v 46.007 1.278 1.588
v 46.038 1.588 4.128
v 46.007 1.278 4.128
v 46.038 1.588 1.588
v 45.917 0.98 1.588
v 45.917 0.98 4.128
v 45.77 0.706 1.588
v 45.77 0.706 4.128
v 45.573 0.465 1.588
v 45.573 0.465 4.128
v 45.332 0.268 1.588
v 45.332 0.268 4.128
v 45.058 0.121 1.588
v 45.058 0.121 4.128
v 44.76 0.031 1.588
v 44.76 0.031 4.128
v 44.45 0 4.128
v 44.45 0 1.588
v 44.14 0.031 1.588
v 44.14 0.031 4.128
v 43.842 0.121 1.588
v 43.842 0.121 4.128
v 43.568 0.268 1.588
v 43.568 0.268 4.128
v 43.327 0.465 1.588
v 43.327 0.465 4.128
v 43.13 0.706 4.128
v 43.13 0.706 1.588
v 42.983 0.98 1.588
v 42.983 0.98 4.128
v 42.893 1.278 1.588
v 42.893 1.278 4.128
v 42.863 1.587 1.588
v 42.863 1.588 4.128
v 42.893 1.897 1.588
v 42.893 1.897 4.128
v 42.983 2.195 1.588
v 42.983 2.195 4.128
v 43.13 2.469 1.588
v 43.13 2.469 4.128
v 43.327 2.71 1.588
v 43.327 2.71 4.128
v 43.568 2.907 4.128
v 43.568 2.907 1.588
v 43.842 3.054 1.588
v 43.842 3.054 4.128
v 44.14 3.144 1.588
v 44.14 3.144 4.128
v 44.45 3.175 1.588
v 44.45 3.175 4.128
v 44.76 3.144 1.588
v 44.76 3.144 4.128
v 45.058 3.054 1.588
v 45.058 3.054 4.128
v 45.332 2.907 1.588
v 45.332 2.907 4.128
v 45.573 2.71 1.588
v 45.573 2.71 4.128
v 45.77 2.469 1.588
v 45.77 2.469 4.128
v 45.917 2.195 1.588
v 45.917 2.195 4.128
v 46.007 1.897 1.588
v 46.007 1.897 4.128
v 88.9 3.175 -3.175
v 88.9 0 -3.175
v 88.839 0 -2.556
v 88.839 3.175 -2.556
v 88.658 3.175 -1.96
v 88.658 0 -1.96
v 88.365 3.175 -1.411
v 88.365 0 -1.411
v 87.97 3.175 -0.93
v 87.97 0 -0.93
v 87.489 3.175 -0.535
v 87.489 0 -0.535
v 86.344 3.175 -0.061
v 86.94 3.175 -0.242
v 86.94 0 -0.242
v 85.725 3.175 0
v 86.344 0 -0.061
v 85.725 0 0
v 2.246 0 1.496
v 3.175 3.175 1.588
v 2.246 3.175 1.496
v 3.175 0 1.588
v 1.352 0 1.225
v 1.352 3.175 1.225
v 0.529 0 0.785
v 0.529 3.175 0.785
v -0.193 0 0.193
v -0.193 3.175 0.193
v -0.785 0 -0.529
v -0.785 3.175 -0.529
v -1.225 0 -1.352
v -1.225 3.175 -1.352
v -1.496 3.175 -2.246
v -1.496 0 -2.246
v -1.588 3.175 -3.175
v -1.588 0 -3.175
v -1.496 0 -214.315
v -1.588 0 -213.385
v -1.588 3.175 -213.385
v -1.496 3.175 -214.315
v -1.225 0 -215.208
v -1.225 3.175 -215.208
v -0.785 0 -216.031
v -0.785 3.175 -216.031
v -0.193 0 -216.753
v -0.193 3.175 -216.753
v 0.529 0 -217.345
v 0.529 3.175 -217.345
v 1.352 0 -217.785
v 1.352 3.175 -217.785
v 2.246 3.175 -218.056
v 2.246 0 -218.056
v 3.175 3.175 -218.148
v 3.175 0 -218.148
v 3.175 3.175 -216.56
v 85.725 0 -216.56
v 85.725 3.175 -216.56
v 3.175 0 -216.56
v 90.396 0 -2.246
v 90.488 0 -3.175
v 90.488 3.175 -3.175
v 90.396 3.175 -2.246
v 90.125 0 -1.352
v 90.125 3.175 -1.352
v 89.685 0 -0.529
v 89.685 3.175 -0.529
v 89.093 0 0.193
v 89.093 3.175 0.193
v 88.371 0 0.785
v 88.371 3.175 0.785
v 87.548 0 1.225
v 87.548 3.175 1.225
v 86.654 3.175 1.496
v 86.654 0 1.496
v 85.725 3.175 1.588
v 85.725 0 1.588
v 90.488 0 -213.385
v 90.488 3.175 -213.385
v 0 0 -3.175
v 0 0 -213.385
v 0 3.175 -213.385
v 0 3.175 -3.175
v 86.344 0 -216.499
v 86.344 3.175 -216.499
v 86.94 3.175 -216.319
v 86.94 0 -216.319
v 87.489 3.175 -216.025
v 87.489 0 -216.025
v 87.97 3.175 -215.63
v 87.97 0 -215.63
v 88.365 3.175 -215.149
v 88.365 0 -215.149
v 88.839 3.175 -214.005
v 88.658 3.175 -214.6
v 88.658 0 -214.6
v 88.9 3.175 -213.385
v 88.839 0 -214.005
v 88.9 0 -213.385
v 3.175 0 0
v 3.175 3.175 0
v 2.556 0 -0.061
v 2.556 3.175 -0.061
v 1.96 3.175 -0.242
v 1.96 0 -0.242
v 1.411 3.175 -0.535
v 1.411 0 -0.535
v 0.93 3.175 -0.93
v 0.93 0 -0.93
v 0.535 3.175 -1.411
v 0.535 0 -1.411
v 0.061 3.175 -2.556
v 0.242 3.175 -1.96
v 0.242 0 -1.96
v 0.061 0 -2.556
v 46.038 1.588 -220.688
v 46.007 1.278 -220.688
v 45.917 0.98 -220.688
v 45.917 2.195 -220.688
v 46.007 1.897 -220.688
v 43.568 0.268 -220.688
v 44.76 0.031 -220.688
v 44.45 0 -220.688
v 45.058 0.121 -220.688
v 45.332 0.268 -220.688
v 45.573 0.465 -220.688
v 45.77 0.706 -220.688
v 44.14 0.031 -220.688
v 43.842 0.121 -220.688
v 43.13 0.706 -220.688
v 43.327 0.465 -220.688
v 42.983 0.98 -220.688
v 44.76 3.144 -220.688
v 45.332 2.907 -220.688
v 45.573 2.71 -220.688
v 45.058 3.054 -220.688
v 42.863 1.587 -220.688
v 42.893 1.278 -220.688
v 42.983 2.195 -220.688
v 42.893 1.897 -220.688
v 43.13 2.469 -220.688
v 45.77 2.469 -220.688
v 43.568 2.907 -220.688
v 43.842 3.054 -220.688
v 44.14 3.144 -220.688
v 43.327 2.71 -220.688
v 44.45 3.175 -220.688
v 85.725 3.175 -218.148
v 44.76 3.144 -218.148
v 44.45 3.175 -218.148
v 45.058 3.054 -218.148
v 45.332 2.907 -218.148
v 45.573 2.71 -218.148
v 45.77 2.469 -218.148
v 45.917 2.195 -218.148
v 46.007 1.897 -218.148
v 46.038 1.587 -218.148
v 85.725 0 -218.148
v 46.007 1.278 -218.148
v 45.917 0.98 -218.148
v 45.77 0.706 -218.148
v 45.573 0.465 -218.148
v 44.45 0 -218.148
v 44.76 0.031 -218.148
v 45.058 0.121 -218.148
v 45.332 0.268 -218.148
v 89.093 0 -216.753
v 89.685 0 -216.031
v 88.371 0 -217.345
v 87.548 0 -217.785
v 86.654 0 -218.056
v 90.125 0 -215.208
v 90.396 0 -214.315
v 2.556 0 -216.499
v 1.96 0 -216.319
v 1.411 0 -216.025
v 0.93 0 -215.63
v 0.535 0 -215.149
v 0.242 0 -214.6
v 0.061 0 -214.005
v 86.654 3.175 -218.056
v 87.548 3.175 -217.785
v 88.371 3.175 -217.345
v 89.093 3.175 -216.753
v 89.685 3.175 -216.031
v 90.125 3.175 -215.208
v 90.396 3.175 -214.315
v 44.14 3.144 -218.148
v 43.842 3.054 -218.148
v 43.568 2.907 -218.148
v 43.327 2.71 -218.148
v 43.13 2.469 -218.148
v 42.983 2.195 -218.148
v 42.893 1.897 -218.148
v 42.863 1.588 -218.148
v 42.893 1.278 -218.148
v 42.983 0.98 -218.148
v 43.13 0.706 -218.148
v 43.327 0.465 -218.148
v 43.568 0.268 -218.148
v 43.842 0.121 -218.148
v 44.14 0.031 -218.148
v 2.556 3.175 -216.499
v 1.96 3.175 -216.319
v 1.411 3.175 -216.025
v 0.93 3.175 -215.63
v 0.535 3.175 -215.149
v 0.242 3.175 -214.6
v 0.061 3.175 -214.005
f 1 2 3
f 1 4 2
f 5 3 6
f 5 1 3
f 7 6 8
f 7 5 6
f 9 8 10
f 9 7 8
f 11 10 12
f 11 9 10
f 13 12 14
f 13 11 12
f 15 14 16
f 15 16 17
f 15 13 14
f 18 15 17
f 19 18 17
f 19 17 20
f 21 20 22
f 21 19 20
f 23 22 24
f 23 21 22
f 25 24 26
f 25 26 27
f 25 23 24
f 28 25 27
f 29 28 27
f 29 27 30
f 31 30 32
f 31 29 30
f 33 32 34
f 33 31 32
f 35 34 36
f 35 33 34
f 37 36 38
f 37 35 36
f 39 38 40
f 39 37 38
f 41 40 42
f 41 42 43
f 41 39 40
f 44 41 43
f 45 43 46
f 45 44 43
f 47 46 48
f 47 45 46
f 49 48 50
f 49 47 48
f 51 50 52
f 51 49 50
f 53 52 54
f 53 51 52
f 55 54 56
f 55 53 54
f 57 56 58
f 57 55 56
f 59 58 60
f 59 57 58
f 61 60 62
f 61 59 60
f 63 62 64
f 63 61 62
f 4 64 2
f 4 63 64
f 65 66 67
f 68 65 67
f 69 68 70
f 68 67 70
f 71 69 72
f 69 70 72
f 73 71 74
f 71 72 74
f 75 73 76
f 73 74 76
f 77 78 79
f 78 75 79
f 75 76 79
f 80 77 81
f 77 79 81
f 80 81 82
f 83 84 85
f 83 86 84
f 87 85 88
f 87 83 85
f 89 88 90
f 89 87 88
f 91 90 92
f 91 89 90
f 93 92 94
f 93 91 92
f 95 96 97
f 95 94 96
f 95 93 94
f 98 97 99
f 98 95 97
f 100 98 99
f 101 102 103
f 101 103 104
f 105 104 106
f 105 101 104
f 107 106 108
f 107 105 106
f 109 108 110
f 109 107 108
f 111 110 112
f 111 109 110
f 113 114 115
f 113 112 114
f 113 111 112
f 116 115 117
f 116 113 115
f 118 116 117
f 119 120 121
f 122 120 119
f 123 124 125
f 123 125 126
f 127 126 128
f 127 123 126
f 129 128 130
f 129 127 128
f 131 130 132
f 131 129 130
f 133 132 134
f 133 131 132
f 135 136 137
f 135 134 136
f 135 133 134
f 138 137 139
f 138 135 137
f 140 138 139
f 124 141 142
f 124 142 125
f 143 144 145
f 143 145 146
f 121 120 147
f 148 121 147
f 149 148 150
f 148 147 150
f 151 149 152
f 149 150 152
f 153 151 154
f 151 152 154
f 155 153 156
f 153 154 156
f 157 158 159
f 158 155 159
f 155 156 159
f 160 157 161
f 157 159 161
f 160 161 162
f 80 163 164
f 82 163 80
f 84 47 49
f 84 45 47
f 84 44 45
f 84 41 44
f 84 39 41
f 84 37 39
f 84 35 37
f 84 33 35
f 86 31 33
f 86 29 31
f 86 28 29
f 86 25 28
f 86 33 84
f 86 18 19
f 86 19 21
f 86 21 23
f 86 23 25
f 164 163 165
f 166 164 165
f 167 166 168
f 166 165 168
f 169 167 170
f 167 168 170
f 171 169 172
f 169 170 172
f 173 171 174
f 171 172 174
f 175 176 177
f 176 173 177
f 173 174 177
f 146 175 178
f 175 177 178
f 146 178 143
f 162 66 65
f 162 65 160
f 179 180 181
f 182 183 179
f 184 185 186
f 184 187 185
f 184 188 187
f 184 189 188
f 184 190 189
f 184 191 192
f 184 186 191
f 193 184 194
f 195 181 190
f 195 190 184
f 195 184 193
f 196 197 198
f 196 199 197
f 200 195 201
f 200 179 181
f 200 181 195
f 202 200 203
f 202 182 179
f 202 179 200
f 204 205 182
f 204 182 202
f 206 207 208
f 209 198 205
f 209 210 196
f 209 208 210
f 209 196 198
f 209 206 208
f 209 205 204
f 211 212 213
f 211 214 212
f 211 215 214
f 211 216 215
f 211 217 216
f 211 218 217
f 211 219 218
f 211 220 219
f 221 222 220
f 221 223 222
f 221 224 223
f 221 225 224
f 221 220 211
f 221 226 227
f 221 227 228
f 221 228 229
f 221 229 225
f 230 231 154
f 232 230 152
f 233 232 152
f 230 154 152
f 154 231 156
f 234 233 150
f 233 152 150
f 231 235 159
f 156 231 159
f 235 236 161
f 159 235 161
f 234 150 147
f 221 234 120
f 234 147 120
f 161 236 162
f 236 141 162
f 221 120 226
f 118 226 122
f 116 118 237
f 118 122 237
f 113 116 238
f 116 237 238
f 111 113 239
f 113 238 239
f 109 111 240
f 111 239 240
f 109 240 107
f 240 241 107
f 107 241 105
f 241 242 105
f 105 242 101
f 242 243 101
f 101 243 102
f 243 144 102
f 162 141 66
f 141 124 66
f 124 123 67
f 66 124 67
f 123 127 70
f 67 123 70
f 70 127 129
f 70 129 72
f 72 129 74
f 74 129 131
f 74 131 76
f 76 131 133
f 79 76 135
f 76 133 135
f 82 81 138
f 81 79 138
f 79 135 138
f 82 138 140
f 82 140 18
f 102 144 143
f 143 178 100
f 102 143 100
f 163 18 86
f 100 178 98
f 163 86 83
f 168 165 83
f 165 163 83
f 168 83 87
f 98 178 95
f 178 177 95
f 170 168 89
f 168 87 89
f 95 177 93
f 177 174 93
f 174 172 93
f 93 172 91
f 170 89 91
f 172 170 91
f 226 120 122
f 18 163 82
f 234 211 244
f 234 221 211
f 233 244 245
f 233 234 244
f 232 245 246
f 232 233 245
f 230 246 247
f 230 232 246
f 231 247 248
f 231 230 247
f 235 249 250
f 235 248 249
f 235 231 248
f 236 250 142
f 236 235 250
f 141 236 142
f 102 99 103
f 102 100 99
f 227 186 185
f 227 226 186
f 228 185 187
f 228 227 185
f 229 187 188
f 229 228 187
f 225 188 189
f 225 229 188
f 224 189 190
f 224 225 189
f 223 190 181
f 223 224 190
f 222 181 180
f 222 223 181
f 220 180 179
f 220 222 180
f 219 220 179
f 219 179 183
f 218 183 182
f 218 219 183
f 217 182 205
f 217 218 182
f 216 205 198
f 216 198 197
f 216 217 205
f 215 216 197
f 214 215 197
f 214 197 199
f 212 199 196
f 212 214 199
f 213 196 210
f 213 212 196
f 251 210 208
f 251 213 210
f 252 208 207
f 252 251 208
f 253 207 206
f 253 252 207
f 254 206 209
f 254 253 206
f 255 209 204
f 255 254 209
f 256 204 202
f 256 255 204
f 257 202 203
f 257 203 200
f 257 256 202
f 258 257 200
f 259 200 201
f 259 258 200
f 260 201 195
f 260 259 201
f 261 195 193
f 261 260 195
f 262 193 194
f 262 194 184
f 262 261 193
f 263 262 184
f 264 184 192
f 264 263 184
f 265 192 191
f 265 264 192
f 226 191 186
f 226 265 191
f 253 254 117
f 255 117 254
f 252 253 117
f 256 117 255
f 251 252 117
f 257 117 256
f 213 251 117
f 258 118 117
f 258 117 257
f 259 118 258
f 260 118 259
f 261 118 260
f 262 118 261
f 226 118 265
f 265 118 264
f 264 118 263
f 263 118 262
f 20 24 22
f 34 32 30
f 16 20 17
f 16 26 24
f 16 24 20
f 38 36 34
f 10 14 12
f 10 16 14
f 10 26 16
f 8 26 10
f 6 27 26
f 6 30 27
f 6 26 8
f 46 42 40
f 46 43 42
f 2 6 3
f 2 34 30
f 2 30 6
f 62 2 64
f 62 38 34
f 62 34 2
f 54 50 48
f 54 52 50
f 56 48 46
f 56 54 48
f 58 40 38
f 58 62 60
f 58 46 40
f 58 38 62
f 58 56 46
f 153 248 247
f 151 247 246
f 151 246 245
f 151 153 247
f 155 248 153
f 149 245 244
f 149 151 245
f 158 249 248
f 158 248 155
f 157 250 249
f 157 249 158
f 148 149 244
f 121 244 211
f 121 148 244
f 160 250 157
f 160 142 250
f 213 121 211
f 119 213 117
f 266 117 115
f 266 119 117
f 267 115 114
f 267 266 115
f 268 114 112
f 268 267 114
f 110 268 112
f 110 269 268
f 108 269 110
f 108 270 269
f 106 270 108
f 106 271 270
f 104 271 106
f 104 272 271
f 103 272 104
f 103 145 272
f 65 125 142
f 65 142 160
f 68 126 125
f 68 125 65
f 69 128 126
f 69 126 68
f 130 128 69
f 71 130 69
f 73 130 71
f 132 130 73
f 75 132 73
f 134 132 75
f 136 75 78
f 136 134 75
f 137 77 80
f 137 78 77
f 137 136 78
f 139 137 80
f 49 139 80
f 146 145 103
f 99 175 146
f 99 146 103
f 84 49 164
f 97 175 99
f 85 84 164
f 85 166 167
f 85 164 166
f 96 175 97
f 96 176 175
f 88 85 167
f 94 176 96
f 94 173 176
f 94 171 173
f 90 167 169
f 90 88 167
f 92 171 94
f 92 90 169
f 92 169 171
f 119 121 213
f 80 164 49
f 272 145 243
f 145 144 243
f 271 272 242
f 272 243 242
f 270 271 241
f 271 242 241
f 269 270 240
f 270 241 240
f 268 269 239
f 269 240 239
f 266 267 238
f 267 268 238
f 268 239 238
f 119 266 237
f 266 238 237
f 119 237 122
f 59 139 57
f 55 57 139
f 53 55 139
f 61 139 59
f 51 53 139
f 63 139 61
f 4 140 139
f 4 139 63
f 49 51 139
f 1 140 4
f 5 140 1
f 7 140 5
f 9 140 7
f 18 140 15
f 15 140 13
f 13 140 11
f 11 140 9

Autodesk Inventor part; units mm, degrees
ref_plane "YZ Plane" through (0, 0, 0) normal (1, 0, 0) x (0, 1, 0)
ref_plane "XZ Plane" through (0, 0, 0) normal (0, 1, 0) x (-1, 0, 0)
ref_plane "XY Plane" through (0, 0, 0) normal (0, 0, 1) x (1, 0, 0)
sketch "Sketch1" plane through (0, 0, 0) normal (0, 1, 0) x (-1, 0, 0)
  line L0 (-3.175, 0) -> (-85.725, 0)
  line L1 (-88.9, -3.175) -> (-88.9, -213.3854)
  line L2 (-85.725, -216.5604) -> (-3.175, -216.5604)
  line L3 (0, -213.3854) -> (0, -3.175)
  arc A0 (0, -3.175) -> (-3.175, 0) centre (-3.175, -3.175) ccw
  arc A1 (-85.725, 0) -> (-88.9, -3.175) centre (-85.725, -3.175) ccw
  arc A2 (-88.9, -213.3854) -> (-85.725, -216.5604) centre (-85.725, -213.3854) ccw
  arc A3 (-3.175, -216.5604) -> (0, -213.3854) centre (-3.175, -213.3854) ccw
  line L4 (1.5875, -3.175) -> (1.5875, -213.3854)
  arc A4 (-3.175, -218.1479) -> (1.5875, -213.3854) centre (-3.175, -213.3854) ccw
  line L5 (-3.175, -218.1479) -> (-85.725, -218.1479)
  arc A5 (-90.4875, -213.3854) -> (-85.725, -218.1479) centre (-85.725, -213.3854) ccw
  line L6 (-90.4875, -213.3854) -> (-90.4875, -3.175)
  arc A6 (-85.725, 1.5875) -> (-90.4875, -3.175) centre (-85.725, -3.175) ccw
  line L7 (-85.725, 1.5875) -> (-3.175, 1.5875)
  arc A7 (1.5875, -3.175) -> (-3.175, 1.5875) centre (-3.175, -3.175) ccw
  point P0 (0, 0)
  point P1 (-88.9, -216.5604)
  point P2 (-88.9, 0)
  point P3 (0, -216.5604)
  dimension "d0" = 88.9
  dimension "d1" = 216.5604
  dimension "d2" = 3.175
extrude "Extrusion2" add sketch "Sketch1" along normal blind 3.175
sketch "Sketch4" plane through (3.175, 0, 1.5875) normal (0, 0, 1) x (1, 0, 0)
  circle A0 centre (41.275, 1.5875) radius 1.5875
  line L0 (0, 0) -> (0, 3.175) projected
  line L1 (0, 0) -> (82.55, 0) projected
  point P0 (-3.175, 0)
  dimension "d11" = 3.175
  dimension "d12" = 41.275
  dimension "d13" = 1.5875
extrude "Extrusion3" add sketch "Sketch4" along normal blind 2.54
sketch "Sketch5" plane through (85.725, 0, -218.1479) normal (0, 0, -1) x (-1, 0, 0)
  arc A0 (41.275, 0) -> (41.275, 3.175) centre (41.275, 1.5875) ccw projected
  circle A1 centre (41.275, 1.5875) radius 1.5875
  point P0 (85.725, 0)
  point P1 (41.275, 3.175)
  point P2 (41.275, 0)
extrude "Extrusion4" add sketch "Sketch5" along normal blind 2.54
properties part number "30t_8.5_in"
